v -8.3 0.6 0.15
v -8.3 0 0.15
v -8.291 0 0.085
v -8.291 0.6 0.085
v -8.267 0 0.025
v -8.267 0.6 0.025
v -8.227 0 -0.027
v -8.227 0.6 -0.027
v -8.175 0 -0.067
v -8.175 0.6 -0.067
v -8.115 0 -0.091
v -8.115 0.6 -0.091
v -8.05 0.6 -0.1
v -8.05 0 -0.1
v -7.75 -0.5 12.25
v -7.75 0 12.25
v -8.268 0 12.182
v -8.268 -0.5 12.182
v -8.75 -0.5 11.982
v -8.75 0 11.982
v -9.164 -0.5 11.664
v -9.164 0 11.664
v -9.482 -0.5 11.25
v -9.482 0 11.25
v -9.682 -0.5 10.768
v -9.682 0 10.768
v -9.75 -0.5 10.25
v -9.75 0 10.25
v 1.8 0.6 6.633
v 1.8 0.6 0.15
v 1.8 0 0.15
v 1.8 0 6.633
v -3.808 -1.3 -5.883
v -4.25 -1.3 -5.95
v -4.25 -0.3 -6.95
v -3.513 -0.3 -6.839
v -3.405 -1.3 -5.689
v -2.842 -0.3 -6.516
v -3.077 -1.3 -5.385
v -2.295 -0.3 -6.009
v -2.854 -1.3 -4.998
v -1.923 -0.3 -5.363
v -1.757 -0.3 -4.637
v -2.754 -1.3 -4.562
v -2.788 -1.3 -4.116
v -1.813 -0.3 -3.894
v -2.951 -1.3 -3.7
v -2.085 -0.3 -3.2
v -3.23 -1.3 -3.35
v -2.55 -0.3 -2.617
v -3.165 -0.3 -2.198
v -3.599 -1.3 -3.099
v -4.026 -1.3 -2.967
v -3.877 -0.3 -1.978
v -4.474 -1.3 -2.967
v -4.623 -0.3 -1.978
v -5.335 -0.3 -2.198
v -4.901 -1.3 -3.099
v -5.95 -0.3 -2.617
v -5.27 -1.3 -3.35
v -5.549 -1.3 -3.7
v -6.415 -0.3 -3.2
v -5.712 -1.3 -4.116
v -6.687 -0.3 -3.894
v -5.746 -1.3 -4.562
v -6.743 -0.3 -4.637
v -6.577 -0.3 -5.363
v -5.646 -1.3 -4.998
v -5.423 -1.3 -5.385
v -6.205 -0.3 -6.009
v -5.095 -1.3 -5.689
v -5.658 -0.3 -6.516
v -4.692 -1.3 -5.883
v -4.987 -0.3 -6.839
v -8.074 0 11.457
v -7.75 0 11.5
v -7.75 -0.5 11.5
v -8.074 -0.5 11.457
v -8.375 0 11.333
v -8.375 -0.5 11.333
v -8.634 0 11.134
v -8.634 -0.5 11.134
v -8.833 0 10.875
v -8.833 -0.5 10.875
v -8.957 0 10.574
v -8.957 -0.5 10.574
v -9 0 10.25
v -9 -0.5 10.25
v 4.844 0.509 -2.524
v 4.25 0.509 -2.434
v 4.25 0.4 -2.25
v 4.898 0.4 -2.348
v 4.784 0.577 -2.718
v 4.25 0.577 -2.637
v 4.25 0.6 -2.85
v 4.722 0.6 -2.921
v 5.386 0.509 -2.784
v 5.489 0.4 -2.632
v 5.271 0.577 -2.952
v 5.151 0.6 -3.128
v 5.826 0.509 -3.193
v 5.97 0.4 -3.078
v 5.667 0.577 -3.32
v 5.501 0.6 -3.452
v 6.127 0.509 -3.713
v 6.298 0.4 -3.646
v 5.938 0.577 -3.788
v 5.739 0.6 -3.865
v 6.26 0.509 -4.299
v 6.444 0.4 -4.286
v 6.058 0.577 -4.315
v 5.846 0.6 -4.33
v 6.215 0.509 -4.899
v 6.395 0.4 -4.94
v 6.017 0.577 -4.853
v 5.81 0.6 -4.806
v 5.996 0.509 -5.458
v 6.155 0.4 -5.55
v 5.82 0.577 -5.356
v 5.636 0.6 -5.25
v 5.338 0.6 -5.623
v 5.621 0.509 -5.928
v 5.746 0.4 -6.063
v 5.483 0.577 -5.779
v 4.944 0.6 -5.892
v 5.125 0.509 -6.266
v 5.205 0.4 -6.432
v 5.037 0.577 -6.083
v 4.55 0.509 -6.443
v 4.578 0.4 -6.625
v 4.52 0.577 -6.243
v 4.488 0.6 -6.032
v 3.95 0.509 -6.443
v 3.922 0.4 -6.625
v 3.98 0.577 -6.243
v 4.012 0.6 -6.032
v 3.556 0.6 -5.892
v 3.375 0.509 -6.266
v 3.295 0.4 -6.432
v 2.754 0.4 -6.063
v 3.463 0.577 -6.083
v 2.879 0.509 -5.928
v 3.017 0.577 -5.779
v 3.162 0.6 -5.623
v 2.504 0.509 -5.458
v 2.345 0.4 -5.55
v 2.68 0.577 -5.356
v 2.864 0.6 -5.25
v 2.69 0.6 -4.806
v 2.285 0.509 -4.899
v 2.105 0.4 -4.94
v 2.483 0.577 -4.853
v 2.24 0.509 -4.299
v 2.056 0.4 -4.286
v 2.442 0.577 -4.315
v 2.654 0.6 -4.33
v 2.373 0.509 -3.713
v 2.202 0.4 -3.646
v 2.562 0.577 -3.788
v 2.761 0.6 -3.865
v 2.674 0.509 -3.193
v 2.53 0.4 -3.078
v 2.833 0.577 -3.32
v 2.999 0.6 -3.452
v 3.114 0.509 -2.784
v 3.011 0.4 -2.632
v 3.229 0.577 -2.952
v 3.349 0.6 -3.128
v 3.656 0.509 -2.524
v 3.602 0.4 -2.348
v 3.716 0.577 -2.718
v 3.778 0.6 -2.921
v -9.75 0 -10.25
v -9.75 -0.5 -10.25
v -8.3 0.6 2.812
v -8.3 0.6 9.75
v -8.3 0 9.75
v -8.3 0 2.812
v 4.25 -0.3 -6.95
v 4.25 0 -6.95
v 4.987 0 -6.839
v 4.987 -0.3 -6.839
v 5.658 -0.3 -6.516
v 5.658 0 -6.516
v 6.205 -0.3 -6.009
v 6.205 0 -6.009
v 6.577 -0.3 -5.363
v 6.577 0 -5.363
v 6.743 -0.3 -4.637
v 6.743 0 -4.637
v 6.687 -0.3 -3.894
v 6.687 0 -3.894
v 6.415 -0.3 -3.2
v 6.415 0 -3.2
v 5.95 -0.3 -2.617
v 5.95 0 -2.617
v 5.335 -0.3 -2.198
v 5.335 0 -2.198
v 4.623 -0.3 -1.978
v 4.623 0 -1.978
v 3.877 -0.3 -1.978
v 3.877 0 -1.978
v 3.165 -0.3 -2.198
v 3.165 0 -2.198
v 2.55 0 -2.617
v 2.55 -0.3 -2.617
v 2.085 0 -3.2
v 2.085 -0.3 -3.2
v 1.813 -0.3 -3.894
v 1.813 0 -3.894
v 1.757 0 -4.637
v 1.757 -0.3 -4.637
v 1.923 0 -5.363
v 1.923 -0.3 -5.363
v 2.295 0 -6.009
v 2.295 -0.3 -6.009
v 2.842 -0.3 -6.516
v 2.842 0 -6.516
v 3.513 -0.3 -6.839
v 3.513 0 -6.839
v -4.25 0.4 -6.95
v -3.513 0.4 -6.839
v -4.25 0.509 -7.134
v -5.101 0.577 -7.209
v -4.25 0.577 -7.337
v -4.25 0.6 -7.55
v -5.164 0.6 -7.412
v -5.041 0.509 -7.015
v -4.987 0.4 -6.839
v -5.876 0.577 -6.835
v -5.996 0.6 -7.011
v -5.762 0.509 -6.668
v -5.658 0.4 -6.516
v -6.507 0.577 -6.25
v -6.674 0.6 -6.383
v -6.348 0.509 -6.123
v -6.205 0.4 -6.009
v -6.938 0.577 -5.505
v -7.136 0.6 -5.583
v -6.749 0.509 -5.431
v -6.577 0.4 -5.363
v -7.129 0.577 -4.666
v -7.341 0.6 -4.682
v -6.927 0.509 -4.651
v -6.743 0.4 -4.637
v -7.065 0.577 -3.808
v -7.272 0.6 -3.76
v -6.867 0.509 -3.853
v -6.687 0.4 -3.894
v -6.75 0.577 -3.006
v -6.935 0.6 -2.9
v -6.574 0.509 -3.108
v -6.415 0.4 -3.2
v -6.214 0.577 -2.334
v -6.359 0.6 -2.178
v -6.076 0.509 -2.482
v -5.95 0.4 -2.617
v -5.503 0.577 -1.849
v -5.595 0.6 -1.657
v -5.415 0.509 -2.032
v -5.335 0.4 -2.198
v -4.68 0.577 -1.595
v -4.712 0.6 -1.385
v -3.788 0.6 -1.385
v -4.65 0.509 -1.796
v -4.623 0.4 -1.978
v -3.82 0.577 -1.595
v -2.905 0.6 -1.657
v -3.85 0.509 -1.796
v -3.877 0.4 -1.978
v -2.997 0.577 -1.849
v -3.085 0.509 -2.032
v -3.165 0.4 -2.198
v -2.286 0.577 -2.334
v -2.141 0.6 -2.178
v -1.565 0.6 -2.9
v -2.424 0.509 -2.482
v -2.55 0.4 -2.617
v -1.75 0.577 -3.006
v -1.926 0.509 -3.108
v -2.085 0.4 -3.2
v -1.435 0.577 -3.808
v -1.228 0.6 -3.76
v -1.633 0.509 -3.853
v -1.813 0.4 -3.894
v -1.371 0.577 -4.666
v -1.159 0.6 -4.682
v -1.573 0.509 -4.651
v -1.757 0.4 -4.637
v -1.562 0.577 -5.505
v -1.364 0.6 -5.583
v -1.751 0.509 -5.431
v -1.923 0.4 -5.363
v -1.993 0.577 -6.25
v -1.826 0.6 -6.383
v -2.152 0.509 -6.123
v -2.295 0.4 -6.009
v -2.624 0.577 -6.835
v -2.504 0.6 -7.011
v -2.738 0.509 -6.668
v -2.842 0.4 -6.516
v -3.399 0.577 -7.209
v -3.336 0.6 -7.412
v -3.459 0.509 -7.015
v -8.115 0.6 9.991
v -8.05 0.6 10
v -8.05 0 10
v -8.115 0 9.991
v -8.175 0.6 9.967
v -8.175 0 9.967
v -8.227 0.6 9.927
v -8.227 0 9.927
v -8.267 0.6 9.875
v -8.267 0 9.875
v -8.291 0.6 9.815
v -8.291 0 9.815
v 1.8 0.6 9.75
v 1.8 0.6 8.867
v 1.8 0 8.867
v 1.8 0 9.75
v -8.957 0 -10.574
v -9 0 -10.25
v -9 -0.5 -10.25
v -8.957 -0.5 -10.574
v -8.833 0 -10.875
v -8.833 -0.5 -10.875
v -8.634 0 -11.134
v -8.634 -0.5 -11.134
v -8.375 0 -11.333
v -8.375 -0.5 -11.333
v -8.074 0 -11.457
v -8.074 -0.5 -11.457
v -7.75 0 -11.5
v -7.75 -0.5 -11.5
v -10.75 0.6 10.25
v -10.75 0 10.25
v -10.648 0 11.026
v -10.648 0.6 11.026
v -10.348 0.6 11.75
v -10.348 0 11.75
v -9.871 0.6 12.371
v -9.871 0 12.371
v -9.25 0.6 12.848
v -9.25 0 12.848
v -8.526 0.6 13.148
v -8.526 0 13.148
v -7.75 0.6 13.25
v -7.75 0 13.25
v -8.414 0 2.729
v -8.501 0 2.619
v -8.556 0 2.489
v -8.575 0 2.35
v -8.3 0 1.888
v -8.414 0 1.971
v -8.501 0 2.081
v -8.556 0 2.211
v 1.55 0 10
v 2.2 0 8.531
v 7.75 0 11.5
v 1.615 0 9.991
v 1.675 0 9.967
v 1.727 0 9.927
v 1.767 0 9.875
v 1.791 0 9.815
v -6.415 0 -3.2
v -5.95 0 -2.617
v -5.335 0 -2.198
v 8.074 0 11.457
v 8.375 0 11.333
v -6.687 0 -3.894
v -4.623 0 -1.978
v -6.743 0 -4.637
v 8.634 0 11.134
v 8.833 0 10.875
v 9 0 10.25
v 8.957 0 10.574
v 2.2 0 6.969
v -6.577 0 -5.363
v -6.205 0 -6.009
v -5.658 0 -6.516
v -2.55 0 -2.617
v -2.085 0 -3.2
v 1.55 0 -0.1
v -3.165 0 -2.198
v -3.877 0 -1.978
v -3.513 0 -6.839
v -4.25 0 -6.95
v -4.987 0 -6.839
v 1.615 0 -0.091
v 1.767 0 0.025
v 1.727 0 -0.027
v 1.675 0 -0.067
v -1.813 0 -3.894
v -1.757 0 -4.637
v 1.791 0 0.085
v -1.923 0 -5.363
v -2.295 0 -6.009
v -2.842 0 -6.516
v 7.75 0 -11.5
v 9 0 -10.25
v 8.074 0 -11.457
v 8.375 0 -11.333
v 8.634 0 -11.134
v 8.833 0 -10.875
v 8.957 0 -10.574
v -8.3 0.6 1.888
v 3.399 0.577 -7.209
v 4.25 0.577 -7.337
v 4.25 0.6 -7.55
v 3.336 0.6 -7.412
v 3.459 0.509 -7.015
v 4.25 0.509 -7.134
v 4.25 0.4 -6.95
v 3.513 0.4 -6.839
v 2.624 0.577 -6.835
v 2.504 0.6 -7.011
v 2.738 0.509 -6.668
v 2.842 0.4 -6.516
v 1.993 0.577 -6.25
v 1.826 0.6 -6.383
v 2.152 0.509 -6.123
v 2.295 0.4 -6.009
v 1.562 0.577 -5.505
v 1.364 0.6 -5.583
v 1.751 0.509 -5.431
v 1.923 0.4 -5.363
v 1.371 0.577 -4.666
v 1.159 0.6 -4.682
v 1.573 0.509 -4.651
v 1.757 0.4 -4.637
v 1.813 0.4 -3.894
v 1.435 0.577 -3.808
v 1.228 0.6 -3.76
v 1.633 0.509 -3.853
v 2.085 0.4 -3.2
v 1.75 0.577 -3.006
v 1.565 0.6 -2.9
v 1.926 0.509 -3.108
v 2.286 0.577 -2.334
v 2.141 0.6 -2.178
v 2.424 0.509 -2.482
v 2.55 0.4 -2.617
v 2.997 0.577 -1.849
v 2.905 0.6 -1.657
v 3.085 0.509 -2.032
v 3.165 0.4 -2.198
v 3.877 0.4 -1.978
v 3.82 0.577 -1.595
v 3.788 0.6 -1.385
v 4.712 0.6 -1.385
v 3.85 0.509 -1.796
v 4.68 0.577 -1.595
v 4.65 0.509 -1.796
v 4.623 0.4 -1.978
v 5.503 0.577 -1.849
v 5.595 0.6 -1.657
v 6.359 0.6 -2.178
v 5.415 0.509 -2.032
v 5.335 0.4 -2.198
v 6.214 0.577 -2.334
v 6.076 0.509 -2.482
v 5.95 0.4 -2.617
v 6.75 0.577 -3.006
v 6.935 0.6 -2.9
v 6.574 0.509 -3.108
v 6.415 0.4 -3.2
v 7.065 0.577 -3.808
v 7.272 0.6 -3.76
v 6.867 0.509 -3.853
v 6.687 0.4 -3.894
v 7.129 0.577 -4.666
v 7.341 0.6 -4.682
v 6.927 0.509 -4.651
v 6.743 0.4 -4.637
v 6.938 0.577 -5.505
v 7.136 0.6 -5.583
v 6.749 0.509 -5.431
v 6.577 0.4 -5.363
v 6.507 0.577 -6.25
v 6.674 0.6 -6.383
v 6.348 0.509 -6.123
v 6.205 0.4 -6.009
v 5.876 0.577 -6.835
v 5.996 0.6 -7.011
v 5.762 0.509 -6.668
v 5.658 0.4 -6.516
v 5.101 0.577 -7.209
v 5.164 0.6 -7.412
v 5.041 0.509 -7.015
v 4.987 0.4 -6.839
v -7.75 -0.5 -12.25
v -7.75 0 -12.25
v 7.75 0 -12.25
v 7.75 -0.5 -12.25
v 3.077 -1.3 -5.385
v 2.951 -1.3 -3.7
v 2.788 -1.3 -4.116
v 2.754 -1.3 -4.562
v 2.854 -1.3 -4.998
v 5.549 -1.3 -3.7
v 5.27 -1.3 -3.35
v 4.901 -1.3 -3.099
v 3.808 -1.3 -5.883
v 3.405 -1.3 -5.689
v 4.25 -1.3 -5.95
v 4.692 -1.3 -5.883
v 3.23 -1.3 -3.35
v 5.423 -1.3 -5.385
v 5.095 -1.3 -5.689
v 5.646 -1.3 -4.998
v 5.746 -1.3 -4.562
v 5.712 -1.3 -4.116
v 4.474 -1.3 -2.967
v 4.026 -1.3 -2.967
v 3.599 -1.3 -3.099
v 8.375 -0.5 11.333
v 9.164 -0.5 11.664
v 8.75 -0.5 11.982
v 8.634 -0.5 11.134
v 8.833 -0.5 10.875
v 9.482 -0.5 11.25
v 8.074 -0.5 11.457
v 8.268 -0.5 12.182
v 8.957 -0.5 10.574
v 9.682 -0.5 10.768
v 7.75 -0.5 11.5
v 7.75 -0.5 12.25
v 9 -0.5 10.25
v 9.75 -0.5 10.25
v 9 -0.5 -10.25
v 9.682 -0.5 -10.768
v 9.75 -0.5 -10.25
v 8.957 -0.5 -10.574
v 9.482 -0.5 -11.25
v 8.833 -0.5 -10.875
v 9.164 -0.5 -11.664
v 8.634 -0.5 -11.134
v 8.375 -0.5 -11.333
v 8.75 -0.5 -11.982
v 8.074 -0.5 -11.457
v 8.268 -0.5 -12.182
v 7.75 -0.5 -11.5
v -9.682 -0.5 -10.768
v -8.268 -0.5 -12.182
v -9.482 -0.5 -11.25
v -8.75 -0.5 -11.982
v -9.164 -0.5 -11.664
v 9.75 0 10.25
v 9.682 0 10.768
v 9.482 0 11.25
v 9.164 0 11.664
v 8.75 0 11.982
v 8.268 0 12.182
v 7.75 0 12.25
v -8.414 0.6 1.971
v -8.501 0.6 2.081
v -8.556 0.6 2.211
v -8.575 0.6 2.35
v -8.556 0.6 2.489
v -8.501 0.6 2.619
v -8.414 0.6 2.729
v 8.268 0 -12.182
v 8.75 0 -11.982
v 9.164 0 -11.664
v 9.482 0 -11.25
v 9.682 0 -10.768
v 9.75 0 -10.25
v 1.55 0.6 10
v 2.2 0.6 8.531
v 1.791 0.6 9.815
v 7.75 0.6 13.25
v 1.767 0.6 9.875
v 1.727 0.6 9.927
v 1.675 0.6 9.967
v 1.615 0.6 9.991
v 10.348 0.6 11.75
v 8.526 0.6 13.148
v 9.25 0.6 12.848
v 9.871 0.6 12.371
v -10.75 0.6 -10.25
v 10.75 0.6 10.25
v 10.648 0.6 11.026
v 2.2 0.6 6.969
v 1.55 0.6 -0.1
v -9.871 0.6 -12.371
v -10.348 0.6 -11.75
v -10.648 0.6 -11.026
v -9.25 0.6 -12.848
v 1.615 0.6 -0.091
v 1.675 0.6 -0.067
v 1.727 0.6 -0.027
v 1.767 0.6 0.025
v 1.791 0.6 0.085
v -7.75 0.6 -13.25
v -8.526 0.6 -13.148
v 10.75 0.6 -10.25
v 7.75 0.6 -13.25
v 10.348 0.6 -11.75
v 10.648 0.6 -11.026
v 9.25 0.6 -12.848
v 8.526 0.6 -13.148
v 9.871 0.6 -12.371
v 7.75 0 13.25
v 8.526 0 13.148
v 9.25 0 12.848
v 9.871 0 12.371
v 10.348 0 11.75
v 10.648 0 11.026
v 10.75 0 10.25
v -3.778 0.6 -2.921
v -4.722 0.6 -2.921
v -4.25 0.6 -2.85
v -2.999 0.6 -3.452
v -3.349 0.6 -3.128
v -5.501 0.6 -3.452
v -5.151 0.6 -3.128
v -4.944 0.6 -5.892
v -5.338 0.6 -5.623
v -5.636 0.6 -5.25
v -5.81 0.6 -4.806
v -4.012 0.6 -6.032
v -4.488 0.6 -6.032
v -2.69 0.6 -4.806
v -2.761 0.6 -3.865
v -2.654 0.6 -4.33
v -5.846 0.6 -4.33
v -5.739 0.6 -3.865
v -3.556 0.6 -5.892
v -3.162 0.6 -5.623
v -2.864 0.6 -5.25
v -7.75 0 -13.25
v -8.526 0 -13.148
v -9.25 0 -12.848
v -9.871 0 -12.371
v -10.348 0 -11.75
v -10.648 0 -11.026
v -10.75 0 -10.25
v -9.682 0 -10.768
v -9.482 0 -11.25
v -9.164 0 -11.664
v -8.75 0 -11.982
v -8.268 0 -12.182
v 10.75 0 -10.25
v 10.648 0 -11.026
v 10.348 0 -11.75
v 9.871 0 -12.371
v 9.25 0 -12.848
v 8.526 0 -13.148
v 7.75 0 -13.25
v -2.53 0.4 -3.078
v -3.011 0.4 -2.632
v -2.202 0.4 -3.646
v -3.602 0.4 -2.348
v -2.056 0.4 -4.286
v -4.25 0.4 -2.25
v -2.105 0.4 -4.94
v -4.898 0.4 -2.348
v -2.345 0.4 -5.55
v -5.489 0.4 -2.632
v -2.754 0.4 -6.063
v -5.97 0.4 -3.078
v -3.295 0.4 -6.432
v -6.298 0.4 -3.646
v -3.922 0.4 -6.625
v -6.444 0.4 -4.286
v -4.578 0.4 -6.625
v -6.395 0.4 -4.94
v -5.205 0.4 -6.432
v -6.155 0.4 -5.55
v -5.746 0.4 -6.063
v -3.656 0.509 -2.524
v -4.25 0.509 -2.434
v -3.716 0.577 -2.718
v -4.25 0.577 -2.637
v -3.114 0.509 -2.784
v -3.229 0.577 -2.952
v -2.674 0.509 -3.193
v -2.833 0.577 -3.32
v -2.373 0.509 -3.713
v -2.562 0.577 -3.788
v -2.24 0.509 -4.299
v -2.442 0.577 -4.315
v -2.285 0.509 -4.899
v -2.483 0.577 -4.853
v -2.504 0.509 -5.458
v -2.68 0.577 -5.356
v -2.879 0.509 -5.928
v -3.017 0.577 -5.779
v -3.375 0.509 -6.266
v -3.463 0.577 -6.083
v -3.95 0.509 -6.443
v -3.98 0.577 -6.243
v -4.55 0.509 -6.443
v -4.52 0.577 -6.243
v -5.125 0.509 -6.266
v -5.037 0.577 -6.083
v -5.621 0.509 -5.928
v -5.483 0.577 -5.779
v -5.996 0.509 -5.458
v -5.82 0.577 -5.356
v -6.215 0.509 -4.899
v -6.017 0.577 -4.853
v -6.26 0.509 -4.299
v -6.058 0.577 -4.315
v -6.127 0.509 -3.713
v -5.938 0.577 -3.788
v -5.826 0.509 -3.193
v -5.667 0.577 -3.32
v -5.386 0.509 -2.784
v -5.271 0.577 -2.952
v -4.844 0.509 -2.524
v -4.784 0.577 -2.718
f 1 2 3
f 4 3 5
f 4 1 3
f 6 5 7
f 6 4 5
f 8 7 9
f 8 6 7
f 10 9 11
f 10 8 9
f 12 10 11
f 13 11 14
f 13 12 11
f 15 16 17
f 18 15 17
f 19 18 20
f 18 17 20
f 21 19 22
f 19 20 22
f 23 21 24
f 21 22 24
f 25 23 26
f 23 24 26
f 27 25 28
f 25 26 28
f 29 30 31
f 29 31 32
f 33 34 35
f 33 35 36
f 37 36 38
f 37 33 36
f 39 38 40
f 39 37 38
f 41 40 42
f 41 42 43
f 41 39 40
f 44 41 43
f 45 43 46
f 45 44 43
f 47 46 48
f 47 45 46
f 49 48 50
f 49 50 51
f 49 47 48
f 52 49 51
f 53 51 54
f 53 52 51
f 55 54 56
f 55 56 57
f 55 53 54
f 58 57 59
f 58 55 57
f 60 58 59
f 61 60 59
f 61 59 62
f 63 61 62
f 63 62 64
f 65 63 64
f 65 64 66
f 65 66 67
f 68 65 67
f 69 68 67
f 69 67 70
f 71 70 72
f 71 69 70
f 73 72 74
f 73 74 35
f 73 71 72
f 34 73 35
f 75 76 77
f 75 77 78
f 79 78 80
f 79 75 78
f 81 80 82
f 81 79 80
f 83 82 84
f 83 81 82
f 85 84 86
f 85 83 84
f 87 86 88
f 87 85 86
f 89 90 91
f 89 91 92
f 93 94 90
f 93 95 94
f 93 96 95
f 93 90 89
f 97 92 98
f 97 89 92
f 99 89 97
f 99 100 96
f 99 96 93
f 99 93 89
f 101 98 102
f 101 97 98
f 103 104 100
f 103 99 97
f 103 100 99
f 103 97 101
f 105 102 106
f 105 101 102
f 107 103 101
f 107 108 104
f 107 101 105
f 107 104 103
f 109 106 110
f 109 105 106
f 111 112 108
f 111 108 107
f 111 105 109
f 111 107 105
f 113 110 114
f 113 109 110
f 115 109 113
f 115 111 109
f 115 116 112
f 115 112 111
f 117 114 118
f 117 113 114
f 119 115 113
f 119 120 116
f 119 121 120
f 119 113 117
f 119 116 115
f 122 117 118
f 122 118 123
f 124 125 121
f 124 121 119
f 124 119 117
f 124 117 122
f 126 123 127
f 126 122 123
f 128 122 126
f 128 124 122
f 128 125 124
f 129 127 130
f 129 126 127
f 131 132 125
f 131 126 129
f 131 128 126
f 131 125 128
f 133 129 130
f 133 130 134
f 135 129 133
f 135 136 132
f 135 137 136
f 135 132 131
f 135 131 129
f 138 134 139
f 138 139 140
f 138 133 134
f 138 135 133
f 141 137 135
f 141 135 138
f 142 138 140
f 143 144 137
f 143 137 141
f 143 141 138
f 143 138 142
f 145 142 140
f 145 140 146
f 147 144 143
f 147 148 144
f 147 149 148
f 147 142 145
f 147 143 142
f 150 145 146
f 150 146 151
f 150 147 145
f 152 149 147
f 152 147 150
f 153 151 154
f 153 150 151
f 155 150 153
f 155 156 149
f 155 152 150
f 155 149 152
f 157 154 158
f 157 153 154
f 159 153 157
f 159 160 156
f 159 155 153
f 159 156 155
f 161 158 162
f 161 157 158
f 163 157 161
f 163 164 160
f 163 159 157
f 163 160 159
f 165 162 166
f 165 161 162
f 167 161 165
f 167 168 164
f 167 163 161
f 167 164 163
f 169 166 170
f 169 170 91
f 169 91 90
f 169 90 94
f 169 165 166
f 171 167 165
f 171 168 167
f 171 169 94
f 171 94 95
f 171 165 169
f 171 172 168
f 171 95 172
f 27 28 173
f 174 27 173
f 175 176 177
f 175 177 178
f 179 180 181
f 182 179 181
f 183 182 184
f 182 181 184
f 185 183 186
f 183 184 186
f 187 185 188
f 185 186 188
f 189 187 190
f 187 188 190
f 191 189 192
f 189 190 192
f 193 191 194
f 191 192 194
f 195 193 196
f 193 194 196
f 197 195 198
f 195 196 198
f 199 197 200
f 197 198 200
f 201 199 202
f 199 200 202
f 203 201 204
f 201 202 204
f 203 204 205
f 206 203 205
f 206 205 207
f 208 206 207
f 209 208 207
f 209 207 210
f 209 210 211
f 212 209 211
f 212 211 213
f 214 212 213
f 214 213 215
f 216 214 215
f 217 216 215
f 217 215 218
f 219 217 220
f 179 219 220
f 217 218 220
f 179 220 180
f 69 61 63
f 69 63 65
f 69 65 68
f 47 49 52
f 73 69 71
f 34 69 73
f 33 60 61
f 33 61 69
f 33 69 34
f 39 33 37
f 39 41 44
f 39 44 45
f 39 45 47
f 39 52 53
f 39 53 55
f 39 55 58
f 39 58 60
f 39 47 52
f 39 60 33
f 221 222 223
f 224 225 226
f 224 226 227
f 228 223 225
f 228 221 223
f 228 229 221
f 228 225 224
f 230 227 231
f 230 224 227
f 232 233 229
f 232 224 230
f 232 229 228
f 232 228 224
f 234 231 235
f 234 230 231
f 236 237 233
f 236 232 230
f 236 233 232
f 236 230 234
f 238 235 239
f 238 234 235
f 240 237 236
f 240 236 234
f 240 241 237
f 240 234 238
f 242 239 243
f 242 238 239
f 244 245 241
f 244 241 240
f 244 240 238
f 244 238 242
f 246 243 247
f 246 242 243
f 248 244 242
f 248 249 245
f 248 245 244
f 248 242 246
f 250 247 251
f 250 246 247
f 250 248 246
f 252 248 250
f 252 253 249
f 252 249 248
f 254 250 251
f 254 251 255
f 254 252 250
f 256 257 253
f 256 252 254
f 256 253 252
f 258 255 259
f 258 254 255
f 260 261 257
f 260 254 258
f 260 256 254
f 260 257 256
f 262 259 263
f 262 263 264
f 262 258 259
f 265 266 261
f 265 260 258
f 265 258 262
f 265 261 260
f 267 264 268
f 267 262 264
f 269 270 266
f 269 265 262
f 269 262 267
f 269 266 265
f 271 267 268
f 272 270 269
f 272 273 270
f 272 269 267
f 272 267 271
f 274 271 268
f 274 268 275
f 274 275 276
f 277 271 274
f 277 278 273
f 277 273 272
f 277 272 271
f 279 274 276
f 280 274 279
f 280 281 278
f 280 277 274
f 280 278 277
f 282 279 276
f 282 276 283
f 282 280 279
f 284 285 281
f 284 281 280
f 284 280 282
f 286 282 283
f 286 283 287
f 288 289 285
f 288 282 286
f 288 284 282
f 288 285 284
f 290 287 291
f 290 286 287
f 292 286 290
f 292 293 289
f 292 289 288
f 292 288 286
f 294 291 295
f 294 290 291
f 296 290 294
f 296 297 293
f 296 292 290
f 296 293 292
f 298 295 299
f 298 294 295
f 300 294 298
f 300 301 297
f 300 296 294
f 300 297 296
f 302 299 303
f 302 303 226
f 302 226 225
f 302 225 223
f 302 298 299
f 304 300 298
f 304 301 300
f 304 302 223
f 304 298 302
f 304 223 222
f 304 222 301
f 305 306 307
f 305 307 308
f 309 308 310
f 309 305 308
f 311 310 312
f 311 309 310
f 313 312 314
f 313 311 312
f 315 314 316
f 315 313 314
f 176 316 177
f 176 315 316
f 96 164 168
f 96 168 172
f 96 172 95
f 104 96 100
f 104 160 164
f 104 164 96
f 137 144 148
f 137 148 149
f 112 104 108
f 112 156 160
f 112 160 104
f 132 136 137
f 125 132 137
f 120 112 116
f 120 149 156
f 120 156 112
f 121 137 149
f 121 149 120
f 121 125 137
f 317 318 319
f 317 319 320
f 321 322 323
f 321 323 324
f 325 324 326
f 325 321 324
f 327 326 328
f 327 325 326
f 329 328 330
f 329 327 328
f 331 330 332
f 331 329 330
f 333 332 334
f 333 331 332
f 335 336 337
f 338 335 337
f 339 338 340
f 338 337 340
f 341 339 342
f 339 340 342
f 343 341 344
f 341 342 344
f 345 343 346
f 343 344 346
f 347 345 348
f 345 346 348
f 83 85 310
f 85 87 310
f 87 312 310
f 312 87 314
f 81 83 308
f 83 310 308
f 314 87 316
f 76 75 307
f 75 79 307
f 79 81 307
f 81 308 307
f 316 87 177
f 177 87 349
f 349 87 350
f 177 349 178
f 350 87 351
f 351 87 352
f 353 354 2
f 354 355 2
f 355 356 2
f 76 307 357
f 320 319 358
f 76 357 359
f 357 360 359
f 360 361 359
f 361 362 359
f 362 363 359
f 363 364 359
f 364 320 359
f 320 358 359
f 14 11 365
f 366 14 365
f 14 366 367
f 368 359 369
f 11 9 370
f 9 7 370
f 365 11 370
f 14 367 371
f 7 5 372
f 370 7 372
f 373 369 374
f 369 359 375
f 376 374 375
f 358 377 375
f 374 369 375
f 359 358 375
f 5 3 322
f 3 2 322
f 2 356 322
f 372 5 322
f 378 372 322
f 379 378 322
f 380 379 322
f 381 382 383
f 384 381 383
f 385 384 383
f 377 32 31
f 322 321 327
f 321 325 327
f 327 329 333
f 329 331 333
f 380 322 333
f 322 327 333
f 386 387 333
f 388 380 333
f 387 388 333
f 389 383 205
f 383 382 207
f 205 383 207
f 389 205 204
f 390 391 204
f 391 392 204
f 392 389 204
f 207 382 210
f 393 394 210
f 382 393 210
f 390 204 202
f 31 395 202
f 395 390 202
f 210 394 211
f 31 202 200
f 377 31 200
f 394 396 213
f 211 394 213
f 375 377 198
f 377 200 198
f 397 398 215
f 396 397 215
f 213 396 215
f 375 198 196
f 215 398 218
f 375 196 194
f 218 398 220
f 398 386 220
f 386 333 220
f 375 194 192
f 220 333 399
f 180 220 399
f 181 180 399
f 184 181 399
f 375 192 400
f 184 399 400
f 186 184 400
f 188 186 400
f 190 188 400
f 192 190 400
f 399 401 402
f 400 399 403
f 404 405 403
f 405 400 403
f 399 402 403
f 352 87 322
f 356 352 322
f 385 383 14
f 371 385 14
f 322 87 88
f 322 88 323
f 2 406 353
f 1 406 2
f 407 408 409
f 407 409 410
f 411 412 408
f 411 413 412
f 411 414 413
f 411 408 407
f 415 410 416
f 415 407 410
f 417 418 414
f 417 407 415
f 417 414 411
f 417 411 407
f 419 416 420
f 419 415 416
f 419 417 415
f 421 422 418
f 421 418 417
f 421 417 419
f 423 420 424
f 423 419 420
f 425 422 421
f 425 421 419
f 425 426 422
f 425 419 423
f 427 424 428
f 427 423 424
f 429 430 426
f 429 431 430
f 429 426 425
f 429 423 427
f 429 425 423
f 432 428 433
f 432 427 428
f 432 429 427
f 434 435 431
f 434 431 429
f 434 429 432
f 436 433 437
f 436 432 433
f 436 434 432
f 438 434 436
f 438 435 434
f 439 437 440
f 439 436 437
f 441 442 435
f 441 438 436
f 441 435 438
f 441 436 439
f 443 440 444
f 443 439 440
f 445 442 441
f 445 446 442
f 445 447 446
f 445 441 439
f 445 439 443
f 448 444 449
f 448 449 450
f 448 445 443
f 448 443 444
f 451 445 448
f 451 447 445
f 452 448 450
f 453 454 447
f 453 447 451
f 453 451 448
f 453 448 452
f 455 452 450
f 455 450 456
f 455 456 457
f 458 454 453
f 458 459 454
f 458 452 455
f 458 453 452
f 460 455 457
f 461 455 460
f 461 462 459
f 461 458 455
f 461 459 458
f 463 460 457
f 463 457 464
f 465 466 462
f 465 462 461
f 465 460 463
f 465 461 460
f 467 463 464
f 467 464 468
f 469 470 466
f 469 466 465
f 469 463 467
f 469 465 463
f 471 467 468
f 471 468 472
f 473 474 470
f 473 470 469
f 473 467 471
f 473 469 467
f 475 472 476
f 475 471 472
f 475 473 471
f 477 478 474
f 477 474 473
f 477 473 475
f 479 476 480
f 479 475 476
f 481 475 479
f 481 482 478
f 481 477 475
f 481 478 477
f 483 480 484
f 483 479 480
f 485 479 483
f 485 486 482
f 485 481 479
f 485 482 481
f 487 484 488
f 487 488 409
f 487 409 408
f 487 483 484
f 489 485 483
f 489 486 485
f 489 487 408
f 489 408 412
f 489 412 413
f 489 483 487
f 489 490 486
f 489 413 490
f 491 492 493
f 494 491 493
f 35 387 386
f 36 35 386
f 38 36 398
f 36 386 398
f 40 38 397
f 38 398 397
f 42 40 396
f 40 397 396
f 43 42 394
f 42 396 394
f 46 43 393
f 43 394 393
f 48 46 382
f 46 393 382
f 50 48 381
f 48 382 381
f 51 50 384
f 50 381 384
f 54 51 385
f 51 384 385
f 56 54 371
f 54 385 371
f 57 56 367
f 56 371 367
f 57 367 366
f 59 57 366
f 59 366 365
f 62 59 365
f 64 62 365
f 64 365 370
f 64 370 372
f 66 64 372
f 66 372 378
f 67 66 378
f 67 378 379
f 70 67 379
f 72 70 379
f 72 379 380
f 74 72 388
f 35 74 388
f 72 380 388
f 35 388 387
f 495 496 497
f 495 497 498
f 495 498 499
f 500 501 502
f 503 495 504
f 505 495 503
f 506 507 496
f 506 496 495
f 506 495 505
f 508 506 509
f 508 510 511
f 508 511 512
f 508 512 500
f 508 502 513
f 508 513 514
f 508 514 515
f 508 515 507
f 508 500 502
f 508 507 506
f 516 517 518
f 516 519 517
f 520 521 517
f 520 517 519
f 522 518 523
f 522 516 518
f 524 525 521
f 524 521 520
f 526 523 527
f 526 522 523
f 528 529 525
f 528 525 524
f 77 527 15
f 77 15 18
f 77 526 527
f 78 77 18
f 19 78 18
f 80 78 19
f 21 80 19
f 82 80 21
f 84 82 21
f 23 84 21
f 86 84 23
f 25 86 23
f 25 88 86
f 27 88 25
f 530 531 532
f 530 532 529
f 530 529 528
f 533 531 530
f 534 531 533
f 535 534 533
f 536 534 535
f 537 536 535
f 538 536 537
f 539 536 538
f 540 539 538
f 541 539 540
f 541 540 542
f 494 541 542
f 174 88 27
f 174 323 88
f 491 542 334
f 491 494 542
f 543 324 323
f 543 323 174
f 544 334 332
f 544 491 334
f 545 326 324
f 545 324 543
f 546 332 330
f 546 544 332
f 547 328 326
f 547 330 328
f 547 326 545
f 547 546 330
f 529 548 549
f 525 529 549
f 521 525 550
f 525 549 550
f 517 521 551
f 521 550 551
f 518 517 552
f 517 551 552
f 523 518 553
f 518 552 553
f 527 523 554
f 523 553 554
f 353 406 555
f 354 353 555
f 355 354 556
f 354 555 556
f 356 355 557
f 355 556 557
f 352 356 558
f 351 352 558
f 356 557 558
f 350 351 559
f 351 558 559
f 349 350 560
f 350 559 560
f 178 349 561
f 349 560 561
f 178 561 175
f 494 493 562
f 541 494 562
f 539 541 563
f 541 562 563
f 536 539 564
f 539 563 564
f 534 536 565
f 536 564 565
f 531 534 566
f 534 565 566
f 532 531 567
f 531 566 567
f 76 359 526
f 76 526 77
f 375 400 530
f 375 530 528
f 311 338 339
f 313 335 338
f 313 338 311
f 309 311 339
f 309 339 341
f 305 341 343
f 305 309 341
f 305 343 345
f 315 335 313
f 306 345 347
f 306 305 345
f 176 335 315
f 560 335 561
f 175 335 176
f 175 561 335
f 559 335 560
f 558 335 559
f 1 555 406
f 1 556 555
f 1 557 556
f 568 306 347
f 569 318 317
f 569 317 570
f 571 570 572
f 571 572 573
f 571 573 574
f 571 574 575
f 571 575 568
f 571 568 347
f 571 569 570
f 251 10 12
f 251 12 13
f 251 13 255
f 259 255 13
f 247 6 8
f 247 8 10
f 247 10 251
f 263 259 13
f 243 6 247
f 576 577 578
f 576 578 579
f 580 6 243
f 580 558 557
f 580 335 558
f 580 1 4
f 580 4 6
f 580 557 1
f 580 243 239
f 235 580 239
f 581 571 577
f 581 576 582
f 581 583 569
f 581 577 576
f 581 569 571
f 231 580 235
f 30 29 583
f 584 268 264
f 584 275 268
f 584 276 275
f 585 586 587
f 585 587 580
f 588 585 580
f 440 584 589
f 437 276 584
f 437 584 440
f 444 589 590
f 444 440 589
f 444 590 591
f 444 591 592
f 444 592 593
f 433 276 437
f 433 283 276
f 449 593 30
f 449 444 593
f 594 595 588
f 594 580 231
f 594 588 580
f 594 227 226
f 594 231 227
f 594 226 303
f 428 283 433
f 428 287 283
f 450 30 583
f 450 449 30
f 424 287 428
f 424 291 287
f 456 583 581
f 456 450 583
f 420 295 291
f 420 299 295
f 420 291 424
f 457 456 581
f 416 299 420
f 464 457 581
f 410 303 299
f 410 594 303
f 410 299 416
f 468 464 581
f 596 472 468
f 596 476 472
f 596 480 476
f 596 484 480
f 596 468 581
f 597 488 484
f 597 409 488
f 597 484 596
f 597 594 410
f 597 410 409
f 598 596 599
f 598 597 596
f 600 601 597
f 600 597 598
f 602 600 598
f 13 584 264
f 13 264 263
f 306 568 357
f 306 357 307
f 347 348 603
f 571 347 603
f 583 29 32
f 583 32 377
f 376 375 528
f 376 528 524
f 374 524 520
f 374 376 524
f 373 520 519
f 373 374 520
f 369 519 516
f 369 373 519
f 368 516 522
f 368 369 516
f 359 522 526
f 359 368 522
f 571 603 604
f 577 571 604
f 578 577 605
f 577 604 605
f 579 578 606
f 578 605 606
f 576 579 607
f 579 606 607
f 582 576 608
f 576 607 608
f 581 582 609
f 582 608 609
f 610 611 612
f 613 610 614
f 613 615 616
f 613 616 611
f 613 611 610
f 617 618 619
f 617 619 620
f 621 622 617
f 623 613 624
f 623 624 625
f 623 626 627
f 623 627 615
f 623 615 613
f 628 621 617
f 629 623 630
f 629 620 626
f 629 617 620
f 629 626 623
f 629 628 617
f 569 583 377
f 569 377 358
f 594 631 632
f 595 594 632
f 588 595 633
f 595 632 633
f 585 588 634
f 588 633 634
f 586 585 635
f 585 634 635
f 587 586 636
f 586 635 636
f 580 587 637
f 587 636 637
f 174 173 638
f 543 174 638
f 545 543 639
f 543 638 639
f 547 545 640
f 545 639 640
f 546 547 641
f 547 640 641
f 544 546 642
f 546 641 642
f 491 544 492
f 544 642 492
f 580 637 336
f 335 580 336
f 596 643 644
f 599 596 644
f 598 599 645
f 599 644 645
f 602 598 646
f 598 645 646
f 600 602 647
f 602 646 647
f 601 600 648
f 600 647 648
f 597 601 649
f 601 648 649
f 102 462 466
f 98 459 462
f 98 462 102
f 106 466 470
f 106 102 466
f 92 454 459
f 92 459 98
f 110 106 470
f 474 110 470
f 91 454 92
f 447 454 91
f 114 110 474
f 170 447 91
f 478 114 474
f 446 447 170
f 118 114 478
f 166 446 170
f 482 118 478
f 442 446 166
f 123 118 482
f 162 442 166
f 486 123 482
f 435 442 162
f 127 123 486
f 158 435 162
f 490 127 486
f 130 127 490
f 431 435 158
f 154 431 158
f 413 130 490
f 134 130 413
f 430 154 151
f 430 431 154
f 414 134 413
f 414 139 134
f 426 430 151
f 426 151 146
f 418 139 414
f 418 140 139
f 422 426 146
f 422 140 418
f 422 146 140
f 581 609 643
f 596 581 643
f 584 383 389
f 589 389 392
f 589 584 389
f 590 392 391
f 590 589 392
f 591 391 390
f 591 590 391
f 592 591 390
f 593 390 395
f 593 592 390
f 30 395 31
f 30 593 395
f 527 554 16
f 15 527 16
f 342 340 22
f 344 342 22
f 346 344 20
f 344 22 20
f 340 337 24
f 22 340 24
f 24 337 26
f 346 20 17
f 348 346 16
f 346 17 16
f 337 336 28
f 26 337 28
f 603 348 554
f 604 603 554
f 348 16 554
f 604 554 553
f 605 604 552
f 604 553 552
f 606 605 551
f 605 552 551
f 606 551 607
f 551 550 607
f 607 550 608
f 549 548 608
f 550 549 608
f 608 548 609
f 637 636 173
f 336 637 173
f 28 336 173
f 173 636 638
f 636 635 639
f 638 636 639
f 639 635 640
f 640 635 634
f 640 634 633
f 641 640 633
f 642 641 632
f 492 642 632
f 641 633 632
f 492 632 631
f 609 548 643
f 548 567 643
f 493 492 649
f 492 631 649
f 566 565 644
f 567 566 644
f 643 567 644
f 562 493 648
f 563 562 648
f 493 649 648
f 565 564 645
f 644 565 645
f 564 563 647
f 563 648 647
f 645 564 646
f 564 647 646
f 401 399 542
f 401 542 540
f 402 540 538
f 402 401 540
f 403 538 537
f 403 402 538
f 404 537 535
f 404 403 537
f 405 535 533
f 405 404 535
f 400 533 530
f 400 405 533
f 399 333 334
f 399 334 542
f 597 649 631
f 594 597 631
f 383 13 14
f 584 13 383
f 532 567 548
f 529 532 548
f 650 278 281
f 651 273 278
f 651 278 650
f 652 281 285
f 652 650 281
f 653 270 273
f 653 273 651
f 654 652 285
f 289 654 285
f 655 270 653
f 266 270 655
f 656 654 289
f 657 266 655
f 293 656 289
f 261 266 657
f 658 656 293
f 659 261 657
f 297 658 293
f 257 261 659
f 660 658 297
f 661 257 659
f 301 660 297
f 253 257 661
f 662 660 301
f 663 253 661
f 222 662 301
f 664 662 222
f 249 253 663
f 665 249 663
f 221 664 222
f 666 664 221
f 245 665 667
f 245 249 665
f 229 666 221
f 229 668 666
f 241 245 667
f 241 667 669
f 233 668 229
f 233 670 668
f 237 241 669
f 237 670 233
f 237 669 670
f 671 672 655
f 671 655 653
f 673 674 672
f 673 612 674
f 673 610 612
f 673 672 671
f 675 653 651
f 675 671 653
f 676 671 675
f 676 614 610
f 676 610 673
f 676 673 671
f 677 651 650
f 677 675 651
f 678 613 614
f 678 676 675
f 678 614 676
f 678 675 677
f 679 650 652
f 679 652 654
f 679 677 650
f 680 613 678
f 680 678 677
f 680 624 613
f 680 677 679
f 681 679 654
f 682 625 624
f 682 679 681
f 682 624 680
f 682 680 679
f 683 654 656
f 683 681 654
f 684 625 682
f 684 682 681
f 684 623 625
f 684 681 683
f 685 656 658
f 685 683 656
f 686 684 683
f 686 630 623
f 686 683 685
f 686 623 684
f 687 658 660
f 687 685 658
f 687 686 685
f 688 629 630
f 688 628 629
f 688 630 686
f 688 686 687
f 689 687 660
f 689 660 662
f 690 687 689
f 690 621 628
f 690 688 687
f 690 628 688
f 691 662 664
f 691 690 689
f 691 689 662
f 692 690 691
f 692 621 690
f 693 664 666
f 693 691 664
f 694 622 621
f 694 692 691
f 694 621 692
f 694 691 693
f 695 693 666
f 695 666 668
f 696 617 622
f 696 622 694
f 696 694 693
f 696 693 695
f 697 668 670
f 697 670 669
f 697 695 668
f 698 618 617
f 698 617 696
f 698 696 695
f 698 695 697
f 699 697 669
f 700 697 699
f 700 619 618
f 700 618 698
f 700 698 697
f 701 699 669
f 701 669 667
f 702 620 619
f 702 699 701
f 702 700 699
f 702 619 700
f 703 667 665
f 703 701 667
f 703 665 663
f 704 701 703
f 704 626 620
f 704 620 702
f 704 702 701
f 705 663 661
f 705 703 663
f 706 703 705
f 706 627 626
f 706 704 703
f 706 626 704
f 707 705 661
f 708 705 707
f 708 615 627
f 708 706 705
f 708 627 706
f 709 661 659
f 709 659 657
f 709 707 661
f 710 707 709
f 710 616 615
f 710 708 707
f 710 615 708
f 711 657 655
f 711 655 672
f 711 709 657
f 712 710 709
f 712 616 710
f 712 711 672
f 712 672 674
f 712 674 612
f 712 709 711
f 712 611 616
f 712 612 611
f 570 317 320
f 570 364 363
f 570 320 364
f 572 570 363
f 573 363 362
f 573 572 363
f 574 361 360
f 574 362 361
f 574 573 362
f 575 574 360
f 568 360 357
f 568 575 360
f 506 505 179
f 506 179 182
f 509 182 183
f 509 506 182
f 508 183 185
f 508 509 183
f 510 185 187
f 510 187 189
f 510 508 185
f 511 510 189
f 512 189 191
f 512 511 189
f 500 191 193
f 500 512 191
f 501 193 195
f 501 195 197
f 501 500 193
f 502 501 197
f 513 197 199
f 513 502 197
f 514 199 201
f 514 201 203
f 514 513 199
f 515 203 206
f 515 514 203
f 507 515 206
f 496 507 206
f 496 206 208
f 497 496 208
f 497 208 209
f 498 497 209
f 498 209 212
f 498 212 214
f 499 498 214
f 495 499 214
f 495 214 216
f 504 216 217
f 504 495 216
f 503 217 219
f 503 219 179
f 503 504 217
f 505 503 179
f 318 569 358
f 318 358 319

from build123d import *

# Parameters (mm, degrees)
BOSS_EXTRUDE1_DEPTH = 0.6
CUT_EXTRUDE1_DEPTH  = 2
SKETCH3_R           = 0.525
CUT_EXTRUDE2_DEPTH  = 10
BOSS_EXTRUDE2_DEPTH = 0.5
SKETCH5_R           = 2.5
BOSS_EXTRUDE3_DEPTH = 1.3
SKETCH6_R           = 2.5
SKETCH6_R_2         = 2.2
CUT_EXTRUDE3_DEPTH  = 0.2
FILLET1_R           = 1
CHAMFER1_SIZE       = 1


with BuildPart() as part:
    # Sketch1 → Boss-Extrude1 (new body)
    with BuildSketch(Plane(origin=(0, 0, 0), x_dir=(1, 0, 0), z_dir=(0, 1, 0))):
        with BuildLine():
            Line((-7.75, -13.25), (7.75, -13.25))
            ThreePointArc((7.75, -13.25), (9.871320344, -12.371320344), (10.75, -10.25))
            Line((10.75, -10.25), (10.75, 10.25))
            ThreePointArc((10.75, 10.25), (9.871320344, 12.371320344), (7.75, 13.25))
            Line((7.75, 13.25), (-7.75, 13.25))
            ThreePointArc((-7.75, 13.25), (-9.871320344, 12.371320344), (-10.75, 10.25))
            Line((-10.75, 10.25), (-10.75, -10.25))
            ThreePointArc((-10.75, -10.25), (-9.871320344, -12.371320344), (-7.75, -13.25))
        make_face()
    extrude(amount=BOSS_EXTRUDE1_DEPTH)

    # Sketch2 → Cut-Extrude1 (cut)
    with BuildSketch(Plane(origin=(0, 0.6, 0), x_dir=(1, 0, 0), z_dir=(0, 1, 0))):
        with BuildLine():
            Line((1.55, -10), (-8.05, -10))
            ThreePointArc((-8.05, -10), (-8.226776695, -9.926776695), (-8.3, -9.75))
            Line((-8.3, -9.75), (-8.3, -0.15))
            ThreePointArc((-8.3, -0.15), (-8.226776695, 0.026776695), (-8.05, 0.1))
            Line((-8.05, 0.1), (1.55, 0.1))
            ThreePointArc((1.55, 0.1), (1.726776695, 0.026776695), (1.8, -0.15))
            Line((1.8, -0.15), (1.8, -9.75))
            ThreePointArc((1.8, -9.75), (1.726776695, -9.926776695), (1.55, -10))
        make_face()
    extrude(amount=-CUT_EXTRUDE1_DEPTH, mode=Mode.SUBTRACT)

    # Sketch3 → Cut-Extrude2 (cut)
    with BuildSketch(Plane(origin=(0, 0.6, 0), x_dir=(1, 0, 0), z_dir=(0, 1, 0))):
        with Locations((-8.05, -2.35)):
            Circle(SKETCH3_R)
        Polygon((2.2, -6.969264593), (2.2, -8.531138717), (1.8, -8.867190969), (1.8, -6.633227233), align=None)
    extrude(amount=-CUT_EXTRUDE2_DEPTH, mode=Mode.SUBTRACT)

    # Sketch4 → Boss-Extrude2 (add)
    with BuildSketch(Plane(origin=(0, 0, 0), x_dir=(-1, 0, 0), z_dir=(0, -1, 0))):
        with BuildLine():
            Line((7.75, 12.25), (-7.75, 12.25))
            ThreePointArc((-7.75, 12.25), (-9.164213562, 11.664213562), (-9.75, 10.25))
            Line((-9.75, 10.25), (-9.75, -10.25))
            ThreePointArc((-9.75, -10.25), (-9.164213562, -11.664213562), (-7.75, -12.25))
            Line((-7.75, -12.25), (7.75, -12.25))
            ThreePointArc((7.75, -12.25), (9.164213562, -11.664213562), (9.75, -10.25))
            Line((9.75, -10.25), (9.75, 10.25))
            ThreePointArc((9.75, 10.25), (9.164213562, 11.664213562), (7.75, 12.25))
        make_face()
        with BuildLine():
            Line((7.75, 11.5), (-7.75, 11.5))
            ThreePointArc((-7.75, 11.5), (-8.633883476, 11.133883476), (-9, 10.25))
            Line((-9, 10.25), (-9, -10.25))
            ThreePointArc((-9, -10.25), (-8.633883476, -11.133883476), (-7.75, -11.5))
            Line((-7.75, -11.5), (7.75, -11.5))
            ThreePointArc((7.75, -11.5), (8.633883476, -11.133883476), (9, -10.25))
            Line((9, -10.25), (9, 10.25))
            ThreePointArc((9, 10.25), (8.633883476, 11.133883476), (7.75, 11.5))
        make_face(mode=Mode.SUBTRACT)
    extrude(amount=BOSS_EXTRUDE2_DEPTH)

    # Sketch5 → Boss-Extrude3 (add)
    with BuildSketch(Plane(origin=(0, 0, 0), x_dir=(-1, 0, 0), z_dir=(0, -1, 0))):
        with Locations(Location((-4.25, 4.45, 0), (0, 0, 90))):
            Circle(SKETCH5_R)
        with Locations(Location((4.25, 4.45, 0), (0, 0, 90))):
            Circle(SKETCH5_R)
    extrude(amount=BOSS_EXTRUDE3_DEPTH)

    # Sketch6 → Cut-Extrude3 (cut)
    # profile 1 of 2: a face of its own
    with BuildSketch(Plane(origin=(0, 0.6, 0), x_dir=(1, 0, 0), z_dir=(0, 1, 0))):
        with Locations(Location((4.25, 4.45, 0), (0, 0, 90))):
            Circle(SKETCH6_R)
        with Locations(Location((4.25, 4.45, 0), (0, 0, 270))):
            Circle(SKETCH6_R_2, mode=Mode.SUBTRACT)
    # profile 2 of 2: a face of its own
    with BuildSketch(Plane(origin=(0, 0.6, 0), x_dir=(1, 0, 0), z_dir=(0, 1, 0))):
        with Locations(Location((-4.25, 4.45, 0), (0, 0, 90))):
            Circle(SKETCH6_R)
        with Locations(Location((-4.25, 4.45, 0), (0, 0, 270))):
            Circle(SKETCH6_R_2, mode=Mode.SUBTRACT)
    extrude(amount=-CUT_EXTRUDE3_DEPTH, mode=Mode.SUBTRACT)

    # Fillet1
    # the kernel refuses this fillet: 1 mm, written as the material it takes off along each edge
    with BuildSketch(Plane(origin=(4.25, 0.6, -4.45), x_dir=(0, 0, -1), z_dir=(1, 0, 0))) as fillet1_piece_1:
        with BuildLine():
            CenterArc((3.1, -1), FILLET1_R, 90, 36.869897646)
            Line((2.5, -0.2), (2.488, -0.184))
            ThreePointArc((2.488, -0.184), (2.48, -0.1), (2.48, 0))
            Line((2.48, 0), (2.5, 0.02))
            Line((2.5, 0.02), (3.1, 0.02))
            Line((3.1, 0.02), (3.1, 0))
        make_face()
    revolve(axis=Axis((4.25, 0.6, -4.45), (0, 1, 0)), mode=Mode.SUBTRACT)
    with BuildSketch(Plane(origin=(4.25, 0.6, -4.45), x_dir=(0, 0, 1), z_dir=(-1, 0, 0))) as fillet1_piece_2:
        with BuildLine():
            CenterArc((1.6, -1), FILLET1_R, 53.130102354, 36.869897646)
            Line((1.6, 0), (1.6, 0.02))
            Line((1.6, 0.02), (2.2, 0.02))
            Line((2.2, 0.02), (2.22, 0))
            ThreePointArc((2.22, 0), (2.22, -0.1), (2.212, -0.184))
            Line((2.212, -0.184), (2.2, -0.2))
        make_face()
    revolve(axis=Axis((4.25, 0.6, -4.45), (0, 1, 0)), mode=Mode.SUBTRACT)
    with BuildSketch(Plane(origin=(-4.25, 0.6, -4.45), x_dir=(0, 0, -1), z_dir=(1, 0, 0))) as fillet1_piece_3:
        with BuildLine():
            CenterArc((3.1, -1), FILLET1_R, 90, 36.869897646)
            Line((2.5, -0.2), (2.488, -0.184))
            ThreePointArc((2.488, -0.184), (2.48, -0.1), (2.48, 0))
            Line((2.48, 0), (2.5, 0.02))
            Line((2.5, 0.02), (3.1, 0.02))
            Line((3.1, 0.02), (3.1, 0))
        make_face()
    revolve(axis=Axis((-4.25, 0.6, -4.45), (0, 1, 0)), mode=Mode.SUBTRACT)
    with BuildSketch(Plane(origin=(-4.25, 0.6, -4.45), x_dir=(0, 0, 1), z_dir=(-1, 0, 0))) as fillet1_piece_4:
        with BuildLine():
            CenterArc((1.6, -1), FILLET1_R, 53.130102354, 36.869897646)
            Line((1.6, 0), (1.6, 0.02))
            Line((1.6, 0.02), (2.2, 0.02))
            Line((2.2, 0.02), (2.22, 0))
            ThreePointArc((2.22, 0), (2.22, -0.1), (2.212, -0.184))
            Line((2.212, -0.184), (2.2, -0.2))
        make_face()
    revolve(axis=Axis((-4.25, 0.6, -4.45), (0, 1, 0)), mode=Mode.SUBTRACT)

    # Chamfer1
    chamfer1_edges = [part.edges().sort_by_distance(p)[0] for p in [
        (4.25, -1.3, -1.95),
        (-4.25, -1.3, -1.95),
    ]]
    chamfer(chamfer1_edges, length=CHAMFER1_SIZE)


solid = part.part
